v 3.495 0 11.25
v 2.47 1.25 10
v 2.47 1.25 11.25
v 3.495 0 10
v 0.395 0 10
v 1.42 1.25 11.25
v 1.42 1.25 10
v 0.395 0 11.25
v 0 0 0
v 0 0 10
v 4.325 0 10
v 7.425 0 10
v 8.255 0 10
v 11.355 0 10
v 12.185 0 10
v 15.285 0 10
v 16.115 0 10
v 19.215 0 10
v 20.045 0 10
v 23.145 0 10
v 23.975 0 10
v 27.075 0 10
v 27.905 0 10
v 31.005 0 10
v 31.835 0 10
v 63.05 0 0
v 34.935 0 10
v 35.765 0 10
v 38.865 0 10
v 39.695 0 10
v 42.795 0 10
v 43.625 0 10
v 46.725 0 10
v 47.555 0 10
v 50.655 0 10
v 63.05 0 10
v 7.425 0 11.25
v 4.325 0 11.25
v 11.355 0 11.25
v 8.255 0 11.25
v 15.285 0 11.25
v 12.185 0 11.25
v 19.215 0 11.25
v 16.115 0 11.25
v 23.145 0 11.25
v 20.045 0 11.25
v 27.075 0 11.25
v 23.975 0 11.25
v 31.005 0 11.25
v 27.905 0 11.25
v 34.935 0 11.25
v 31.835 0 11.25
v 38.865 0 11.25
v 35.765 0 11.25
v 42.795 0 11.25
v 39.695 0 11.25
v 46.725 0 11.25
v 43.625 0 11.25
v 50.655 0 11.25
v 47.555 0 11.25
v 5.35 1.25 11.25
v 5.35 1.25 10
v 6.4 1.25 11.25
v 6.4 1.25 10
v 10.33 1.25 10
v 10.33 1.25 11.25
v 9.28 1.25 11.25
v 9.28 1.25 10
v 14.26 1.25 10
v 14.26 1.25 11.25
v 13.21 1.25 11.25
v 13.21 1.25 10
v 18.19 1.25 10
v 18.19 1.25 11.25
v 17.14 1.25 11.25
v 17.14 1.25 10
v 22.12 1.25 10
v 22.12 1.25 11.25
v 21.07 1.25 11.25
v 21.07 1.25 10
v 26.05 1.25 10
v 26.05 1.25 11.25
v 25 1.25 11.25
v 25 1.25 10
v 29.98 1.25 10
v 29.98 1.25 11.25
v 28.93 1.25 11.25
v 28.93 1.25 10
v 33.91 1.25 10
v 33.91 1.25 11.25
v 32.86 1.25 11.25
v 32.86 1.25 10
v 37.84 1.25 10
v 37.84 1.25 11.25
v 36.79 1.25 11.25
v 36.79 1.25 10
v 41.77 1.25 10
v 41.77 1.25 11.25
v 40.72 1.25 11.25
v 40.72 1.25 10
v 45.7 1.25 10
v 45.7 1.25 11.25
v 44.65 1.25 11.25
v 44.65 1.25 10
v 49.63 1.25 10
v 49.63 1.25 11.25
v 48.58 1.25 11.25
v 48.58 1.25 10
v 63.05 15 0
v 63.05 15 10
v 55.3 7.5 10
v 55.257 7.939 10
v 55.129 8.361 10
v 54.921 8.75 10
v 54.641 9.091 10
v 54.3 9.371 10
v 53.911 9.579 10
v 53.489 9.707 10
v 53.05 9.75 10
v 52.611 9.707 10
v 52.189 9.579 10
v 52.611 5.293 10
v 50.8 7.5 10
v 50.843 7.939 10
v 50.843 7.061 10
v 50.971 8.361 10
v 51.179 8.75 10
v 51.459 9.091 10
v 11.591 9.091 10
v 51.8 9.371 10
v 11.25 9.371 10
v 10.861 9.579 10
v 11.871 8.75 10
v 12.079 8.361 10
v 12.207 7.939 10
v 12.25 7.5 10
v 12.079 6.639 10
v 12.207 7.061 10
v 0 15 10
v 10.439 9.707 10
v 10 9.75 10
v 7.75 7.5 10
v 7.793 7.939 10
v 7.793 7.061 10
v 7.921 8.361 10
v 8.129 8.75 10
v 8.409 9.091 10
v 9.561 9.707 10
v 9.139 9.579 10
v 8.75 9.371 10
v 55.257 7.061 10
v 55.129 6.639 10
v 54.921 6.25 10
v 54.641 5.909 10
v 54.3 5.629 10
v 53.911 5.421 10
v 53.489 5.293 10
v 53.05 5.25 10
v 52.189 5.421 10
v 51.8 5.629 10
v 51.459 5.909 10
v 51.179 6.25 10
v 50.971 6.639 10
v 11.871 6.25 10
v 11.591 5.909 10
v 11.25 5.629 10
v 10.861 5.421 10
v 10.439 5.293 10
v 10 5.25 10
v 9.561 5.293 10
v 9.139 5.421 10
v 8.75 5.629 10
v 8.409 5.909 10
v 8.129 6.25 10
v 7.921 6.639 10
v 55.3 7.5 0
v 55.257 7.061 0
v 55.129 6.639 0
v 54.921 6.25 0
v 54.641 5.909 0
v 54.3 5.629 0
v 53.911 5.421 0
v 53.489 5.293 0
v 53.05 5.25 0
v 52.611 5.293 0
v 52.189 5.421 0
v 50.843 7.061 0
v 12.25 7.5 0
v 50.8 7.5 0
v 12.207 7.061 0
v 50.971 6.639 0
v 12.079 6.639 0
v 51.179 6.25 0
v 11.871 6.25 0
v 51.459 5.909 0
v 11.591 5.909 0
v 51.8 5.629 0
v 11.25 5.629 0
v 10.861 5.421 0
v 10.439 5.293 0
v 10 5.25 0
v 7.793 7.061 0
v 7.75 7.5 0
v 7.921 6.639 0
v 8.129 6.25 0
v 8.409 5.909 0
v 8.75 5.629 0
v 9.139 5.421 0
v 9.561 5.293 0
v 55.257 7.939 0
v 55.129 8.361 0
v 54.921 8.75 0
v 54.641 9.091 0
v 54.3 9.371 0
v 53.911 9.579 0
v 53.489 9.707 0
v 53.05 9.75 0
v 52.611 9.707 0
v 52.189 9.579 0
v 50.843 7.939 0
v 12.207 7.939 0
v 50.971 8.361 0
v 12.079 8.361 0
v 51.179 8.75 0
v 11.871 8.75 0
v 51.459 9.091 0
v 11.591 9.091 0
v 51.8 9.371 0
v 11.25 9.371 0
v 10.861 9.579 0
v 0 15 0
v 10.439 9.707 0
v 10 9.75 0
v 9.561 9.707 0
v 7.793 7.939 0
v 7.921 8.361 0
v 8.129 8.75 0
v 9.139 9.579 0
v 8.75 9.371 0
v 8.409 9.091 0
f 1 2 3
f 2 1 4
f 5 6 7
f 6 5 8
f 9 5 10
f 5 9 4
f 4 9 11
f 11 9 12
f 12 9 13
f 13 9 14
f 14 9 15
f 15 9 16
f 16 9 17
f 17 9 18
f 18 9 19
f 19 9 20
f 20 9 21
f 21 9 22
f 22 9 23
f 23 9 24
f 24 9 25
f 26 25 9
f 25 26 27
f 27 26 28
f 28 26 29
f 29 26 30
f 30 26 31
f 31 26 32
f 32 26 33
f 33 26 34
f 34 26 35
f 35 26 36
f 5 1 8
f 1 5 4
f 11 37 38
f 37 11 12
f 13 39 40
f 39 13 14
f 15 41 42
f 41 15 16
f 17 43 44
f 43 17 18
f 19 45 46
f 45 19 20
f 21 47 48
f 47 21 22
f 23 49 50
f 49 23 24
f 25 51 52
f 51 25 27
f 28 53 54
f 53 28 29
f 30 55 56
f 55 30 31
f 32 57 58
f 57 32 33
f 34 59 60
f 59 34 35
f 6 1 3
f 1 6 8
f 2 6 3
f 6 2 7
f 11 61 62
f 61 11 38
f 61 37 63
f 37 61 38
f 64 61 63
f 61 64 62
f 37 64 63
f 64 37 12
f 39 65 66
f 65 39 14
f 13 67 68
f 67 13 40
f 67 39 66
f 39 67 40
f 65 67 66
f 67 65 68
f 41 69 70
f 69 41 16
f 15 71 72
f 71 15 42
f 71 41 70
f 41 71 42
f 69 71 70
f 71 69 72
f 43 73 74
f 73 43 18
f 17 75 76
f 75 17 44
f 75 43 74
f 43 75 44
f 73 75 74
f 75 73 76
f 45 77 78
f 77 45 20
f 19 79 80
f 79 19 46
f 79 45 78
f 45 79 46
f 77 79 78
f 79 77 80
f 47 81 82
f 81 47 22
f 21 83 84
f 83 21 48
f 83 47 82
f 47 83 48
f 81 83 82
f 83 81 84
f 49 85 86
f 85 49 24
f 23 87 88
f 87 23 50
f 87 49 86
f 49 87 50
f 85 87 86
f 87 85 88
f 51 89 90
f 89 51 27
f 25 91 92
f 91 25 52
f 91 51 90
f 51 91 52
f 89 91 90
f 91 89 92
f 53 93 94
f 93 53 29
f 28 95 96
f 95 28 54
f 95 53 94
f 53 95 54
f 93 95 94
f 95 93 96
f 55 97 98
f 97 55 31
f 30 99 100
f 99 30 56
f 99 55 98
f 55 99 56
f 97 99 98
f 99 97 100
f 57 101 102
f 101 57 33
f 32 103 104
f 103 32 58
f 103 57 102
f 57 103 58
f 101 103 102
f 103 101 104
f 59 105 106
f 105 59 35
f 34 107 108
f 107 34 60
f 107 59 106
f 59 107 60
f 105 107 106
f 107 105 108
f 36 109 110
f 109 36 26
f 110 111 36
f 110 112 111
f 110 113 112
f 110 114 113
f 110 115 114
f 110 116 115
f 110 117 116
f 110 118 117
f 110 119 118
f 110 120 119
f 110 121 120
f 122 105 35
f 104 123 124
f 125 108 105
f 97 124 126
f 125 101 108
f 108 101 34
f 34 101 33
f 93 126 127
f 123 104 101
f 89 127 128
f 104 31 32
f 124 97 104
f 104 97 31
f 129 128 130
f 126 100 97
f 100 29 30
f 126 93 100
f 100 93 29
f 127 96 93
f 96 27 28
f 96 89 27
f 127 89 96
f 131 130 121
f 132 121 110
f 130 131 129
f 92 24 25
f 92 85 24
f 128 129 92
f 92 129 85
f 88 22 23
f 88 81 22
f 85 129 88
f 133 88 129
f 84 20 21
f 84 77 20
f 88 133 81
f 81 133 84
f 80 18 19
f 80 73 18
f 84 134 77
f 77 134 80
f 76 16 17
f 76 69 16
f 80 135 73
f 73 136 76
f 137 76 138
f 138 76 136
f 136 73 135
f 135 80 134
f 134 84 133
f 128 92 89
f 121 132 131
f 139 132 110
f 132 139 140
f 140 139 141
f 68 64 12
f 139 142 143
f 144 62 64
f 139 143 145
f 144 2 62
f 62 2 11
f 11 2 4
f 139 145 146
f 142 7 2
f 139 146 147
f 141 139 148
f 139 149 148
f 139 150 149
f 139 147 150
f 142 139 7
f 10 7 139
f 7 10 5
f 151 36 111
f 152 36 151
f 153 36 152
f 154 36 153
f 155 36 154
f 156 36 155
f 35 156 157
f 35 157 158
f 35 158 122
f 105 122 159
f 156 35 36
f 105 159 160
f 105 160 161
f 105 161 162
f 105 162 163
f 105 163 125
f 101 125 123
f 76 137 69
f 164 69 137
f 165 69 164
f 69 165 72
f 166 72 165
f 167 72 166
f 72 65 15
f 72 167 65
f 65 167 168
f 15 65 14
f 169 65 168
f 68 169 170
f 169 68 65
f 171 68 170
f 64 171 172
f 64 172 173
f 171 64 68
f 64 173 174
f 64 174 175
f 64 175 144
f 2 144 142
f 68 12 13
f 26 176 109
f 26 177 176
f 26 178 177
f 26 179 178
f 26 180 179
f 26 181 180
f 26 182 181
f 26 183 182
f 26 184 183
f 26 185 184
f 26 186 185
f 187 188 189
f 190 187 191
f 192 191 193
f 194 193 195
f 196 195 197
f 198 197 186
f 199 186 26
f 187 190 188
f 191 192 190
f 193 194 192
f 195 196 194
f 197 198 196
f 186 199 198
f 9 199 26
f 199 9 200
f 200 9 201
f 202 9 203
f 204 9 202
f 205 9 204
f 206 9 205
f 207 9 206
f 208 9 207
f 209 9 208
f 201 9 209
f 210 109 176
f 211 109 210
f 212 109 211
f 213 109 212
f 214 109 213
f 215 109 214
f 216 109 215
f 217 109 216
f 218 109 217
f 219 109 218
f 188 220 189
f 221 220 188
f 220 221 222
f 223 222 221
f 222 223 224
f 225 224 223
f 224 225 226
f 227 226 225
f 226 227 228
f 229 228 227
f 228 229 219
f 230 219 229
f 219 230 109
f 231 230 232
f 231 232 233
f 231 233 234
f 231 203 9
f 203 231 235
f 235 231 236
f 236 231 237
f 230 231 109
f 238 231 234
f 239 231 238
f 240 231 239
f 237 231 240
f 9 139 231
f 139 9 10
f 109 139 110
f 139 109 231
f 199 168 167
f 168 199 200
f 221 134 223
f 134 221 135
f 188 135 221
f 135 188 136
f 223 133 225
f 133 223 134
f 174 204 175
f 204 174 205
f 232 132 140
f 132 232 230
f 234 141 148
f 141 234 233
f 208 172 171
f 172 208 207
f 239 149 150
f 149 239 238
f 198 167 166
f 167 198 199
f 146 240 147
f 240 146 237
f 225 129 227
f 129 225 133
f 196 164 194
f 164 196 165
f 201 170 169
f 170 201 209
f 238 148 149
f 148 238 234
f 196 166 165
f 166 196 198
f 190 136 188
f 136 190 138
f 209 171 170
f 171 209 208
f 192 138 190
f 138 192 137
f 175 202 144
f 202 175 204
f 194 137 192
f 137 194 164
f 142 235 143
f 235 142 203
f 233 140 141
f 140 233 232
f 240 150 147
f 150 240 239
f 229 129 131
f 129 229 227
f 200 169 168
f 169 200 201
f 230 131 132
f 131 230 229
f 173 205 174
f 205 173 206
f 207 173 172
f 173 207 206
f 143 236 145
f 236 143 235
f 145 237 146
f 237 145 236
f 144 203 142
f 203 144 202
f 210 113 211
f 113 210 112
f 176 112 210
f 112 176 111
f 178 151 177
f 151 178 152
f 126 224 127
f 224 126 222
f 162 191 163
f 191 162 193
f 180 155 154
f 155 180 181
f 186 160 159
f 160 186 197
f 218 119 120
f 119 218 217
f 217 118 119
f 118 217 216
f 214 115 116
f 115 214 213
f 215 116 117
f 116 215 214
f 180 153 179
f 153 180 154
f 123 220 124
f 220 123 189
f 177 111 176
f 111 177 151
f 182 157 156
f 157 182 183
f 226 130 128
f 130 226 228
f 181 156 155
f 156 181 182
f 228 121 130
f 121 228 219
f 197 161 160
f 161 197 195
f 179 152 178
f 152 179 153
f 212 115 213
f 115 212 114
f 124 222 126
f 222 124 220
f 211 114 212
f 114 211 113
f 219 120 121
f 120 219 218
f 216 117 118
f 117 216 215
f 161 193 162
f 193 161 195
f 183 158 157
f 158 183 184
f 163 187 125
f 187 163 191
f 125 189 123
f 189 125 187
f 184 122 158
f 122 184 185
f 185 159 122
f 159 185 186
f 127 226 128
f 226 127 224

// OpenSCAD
$fn = 32;

// ----------------------------------------------------------------------
// Gear rack: m=1.25 z=13, 63.05 x 15 x 11.25 mm
// ----------------------------------------------------------------------

// --- parameters (mm) ---
length = 63.05;           // rack length, X
width = 15;               // rack width, Y
height = 11.25;           // overall height, Z
module_m = 1.25;          // module
back_t = 10;              // tooth root line height
pitch = 3.93;             // circular pitch
tip_w = 1.05;             // tooth thickness at the tip
root_w = 3.1;             // tooth thickness at the root line
hole_d = 4.5;             // mounting hole
sink = 0.6;               // tooth root overlap into the body

tooth_span = 51.05;

module tooth(x0) {
  /* 20 deg flank profile, sunk into the body for a positive overlap */
  translate([x0, 0, back_t - sink])
    linear_extrude(height = height - back_t + sink)
      polygon(points = [[-root_w / 2, 0], [root_w / 2, 0],
                        [tip_w / 2, height - back_t],
                        [-tip_w / 2, height - back_t]]);
}

difference() {
  union() {
    cube([length, width, back_t]);
    for (i = [0 : 13 - 1])
      tooth((i + 0.5) * pitch + (tooth_span - 13 * pitch) / 2);
  }
  translate([10, 7.5, -1]) cylinder(h = back_t + 2, d = hole_d);
  translate([53.05, 7.5, -1]) cylinder(h = back_t + 2, d = hole_d);
}
